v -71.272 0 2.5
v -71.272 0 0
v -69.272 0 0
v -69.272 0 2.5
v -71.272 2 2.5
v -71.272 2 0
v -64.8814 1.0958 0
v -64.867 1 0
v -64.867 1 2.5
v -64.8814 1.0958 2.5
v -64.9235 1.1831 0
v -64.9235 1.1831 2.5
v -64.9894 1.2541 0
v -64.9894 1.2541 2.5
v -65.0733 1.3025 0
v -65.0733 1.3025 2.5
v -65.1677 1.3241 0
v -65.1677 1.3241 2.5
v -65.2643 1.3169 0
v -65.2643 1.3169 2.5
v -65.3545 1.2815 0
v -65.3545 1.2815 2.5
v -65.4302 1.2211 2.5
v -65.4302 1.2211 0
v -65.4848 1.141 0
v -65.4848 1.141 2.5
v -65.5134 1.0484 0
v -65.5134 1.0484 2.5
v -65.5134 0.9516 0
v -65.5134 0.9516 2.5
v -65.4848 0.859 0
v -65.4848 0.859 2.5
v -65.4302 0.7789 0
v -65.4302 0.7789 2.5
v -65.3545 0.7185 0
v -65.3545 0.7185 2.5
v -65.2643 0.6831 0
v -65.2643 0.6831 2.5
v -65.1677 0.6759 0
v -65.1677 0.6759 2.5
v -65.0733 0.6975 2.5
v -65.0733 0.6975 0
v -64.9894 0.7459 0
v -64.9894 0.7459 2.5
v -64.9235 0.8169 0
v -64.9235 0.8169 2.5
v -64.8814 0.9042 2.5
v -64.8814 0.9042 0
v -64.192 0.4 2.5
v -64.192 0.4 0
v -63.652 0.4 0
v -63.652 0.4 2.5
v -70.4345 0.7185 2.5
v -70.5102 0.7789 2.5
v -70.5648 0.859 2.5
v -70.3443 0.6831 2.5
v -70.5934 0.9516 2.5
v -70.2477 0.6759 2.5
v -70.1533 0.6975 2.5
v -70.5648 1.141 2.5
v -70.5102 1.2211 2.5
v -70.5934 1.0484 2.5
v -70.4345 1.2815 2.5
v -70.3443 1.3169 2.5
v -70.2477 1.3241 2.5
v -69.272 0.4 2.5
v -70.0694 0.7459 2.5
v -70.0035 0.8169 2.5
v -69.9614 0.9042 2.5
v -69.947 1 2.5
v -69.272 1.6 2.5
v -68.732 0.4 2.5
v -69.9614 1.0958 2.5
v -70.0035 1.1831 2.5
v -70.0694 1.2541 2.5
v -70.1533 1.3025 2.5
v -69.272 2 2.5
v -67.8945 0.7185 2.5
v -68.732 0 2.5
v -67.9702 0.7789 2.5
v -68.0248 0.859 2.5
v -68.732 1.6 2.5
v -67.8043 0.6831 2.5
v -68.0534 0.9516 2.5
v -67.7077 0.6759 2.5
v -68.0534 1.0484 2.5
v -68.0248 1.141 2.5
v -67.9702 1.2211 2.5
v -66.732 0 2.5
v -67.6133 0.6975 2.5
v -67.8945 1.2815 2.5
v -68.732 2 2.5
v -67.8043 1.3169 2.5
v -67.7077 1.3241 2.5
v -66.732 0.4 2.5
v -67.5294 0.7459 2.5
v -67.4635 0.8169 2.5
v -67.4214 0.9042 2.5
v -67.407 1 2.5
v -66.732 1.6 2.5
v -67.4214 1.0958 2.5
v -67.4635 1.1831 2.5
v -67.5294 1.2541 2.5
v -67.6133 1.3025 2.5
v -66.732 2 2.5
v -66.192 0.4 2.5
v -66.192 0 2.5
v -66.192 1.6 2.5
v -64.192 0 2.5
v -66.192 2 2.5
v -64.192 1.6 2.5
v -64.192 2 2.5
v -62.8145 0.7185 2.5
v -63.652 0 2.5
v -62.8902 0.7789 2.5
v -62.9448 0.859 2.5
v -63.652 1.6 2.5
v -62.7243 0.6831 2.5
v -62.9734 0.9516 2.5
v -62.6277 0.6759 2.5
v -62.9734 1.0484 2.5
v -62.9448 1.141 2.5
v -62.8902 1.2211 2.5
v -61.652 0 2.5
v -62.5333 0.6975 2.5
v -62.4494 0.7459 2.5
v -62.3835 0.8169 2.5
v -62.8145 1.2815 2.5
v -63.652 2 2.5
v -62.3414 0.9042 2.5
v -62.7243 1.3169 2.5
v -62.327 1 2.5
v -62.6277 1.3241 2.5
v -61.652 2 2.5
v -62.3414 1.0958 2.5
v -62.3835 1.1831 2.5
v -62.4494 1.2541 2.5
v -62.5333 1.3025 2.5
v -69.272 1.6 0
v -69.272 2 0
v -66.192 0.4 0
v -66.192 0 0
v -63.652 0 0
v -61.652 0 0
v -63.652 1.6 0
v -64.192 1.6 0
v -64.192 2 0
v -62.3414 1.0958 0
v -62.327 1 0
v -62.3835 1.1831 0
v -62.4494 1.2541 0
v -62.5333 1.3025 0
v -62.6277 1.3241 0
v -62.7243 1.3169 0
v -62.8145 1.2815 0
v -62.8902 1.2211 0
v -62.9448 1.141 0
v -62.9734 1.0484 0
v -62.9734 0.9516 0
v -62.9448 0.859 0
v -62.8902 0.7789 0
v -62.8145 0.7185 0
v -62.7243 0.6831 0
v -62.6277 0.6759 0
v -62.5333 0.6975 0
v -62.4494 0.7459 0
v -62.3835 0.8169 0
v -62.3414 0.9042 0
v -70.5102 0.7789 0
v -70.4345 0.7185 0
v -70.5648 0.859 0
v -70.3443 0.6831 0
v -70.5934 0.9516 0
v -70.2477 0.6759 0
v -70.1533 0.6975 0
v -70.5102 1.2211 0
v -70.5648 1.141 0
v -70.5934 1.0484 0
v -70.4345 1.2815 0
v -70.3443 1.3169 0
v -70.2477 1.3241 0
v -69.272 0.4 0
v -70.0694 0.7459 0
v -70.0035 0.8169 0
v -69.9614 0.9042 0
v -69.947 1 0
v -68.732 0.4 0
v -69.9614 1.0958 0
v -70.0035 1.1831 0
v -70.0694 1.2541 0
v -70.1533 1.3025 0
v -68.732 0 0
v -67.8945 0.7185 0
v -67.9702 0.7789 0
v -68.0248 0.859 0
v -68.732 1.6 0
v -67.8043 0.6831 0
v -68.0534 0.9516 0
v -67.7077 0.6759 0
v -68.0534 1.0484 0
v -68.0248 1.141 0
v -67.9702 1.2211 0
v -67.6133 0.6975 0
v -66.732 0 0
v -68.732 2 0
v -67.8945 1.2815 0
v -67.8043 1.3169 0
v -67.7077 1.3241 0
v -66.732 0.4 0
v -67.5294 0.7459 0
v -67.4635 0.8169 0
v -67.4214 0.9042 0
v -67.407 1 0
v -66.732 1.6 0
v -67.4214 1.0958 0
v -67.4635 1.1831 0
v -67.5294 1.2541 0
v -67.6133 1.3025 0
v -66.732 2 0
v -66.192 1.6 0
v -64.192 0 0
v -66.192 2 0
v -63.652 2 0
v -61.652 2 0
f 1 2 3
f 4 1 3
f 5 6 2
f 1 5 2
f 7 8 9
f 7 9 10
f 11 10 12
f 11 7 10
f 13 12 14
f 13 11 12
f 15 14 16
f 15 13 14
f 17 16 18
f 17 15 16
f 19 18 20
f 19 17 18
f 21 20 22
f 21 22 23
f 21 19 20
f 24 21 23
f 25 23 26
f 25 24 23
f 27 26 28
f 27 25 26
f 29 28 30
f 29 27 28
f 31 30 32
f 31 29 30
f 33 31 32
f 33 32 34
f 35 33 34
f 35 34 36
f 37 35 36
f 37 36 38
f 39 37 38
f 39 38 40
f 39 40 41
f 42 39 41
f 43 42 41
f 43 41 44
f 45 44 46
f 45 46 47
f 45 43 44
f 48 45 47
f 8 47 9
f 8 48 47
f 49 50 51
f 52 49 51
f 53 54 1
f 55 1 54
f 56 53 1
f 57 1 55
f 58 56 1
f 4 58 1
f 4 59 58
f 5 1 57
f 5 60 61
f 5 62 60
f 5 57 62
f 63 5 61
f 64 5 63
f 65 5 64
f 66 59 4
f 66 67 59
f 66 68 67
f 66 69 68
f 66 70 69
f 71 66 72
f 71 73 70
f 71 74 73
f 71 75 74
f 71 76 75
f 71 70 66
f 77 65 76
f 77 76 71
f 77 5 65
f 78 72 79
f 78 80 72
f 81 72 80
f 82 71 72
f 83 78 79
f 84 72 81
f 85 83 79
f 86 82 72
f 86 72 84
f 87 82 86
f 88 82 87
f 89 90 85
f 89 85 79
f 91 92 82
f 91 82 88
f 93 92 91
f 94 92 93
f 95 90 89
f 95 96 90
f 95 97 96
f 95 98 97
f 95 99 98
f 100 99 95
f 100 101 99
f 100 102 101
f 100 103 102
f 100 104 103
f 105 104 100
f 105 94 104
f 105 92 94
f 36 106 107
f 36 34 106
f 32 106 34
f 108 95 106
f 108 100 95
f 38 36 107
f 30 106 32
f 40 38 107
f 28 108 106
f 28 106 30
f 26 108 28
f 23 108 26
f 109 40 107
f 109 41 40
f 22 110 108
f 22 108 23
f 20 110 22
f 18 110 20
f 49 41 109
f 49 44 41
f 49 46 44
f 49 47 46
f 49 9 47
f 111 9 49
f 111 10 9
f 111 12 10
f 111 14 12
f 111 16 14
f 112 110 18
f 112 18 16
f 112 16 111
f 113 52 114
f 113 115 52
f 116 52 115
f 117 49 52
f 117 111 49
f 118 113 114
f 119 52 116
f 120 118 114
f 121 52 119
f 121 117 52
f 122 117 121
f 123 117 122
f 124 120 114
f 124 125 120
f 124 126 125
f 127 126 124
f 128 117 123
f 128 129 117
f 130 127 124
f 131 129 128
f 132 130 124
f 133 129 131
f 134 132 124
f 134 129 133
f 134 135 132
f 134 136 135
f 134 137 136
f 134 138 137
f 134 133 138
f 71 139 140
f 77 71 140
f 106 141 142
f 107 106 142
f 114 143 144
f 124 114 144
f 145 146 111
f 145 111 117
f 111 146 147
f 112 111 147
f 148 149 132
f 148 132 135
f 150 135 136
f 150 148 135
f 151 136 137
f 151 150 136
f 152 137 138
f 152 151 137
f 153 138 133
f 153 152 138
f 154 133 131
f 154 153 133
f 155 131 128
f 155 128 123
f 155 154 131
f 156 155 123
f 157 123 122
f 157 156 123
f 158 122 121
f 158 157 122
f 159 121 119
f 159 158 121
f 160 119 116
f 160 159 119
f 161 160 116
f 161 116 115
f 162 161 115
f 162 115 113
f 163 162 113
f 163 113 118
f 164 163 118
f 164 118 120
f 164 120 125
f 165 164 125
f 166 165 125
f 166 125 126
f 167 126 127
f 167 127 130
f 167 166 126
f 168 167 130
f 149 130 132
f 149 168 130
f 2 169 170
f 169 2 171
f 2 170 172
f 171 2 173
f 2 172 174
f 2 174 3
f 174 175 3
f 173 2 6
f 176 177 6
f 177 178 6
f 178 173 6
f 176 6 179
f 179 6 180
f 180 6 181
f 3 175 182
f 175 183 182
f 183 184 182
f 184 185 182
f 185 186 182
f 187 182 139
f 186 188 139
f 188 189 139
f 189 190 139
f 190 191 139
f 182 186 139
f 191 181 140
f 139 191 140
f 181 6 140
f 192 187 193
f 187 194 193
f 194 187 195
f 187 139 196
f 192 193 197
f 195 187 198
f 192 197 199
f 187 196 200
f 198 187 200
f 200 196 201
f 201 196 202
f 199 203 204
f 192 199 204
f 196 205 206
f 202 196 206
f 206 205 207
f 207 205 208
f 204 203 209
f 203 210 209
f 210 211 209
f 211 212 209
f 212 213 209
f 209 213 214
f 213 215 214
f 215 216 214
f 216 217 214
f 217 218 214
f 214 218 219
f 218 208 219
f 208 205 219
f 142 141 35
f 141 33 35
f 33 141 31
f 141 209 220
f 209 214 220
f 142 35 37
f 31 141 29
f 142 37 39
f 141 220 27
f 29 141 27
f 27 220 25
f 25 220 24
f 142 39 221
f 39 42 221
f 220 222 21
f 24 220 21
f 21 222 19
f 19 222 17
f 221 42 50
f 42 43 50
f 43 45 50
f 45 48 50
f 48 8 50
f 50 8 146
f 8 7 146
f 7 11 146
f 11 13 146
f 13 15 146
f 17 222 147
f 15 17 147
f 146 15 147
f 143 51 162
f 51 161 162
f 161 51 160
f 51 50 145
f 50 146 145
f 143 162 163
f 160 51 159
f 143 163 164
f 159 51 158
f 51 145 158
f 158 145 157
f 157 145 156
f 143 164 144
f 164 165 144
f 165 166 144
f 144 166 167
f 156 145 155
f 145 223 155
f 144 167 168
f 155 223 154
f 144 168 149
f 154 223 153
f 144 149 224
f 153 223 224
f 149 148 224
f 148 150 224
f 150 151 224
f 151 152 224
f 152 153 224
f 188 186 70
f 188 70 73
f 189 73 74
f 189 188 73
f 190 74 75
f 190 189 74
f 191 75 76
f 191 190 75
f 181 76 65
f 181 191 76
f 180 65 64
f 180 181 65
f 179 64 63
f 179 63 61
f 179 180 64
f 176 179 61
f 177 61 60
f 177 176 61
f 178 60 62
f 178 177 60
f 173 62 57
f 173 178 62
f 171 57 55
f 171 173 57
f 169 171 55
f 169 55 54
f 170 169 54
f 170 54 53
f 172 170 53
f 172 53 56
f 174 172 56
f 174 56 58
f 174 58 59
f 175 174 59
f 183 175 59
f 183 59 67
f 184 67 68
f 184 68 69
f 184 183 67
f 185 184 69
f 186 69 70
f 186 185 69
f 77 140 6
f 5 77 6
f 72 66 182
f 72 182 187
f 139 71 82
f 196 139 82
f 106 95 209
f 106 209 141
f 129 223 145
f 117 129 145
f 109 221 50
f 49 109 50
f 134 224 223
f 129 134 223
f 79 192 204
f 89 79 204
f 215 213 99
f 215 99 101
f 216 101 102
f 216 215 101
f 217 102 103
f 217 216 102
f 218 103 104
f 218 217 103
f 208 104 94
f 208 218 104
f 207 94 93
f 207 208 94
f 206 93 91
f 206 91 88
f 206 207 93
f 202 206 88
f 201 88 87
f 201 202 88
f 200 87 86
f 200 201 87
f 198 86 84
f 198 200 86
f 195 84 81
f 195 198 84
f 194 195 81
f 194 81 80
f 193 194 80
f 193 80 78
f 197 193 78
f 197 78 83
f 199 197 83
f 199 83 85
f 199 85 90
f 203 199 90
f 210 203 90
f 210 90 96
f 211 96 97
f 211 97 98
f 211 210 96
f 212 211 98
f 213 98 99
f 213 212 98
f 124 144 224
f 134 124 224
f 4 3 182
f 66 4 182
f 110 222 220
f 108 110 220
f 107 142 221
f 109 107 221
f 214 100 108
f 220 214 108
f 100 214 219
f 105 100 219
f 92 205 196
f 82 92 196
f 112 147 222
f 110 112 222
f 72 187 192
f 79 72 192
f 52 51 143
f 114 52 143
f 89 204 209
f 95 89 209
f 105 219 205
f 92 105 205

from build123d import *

# Parameters (mm, degrees)
F0_R     = 0.325
F0_W     = 0.54
F0_H     = 1.2
F1_DEPTH = 2.5


with BuildPart() as f1:
    # F0 (on Top) → F1 (new body)
    with BuildSketch(Plane.XY):
        Polygon((-71.271986, 0), (-69.271986, 0), (-69.271986, 0.4), (-69.271986, 1.6), (-69.271986, 2), (-71.271986, 2), align=None)
        with Locations((-70.271986, 1)):
            Circle(F0_R, mode=Mode.SUBTRACT)
        with Locations((-69.001986, 1)):
            Rectangle(F0_W, F0_H)
        Polygon((-68.731986, 1.6), (-68.731986, 0.4), (-68.731986, 0), (-66.731986, 0), (-66.731986, 0.4), (-66.731986, 1.6), (-66.731986, 2), (-68.731986, 2), align=None)
        with Locations((-67.731986, 1)):
            Circle(F0_R, mode=Mode.SUBTRACT)
        with Locations((-66.461986, 1)):
            Rectangle(F0_W, F0_H)
        Polygon((-66.191986, 1.6), (-66.191986, 0.4), (-66.191986, 0), (-64.191986, 0), (-64.191986, 0.4), (-64.191986, 1.6), (-64.191986, 2), (-66.191986, 2), align=None)
        with Locations((-65.191986, 1)):
            Circle(F0_R, mode=Mode.SUBTRACT)
        with Locations((-63.921986, 1)):
            Rectangle(F0_W, F0_H)
        Polygon((-63.651986, 1.6), (-63.651986, 0.4), (-63.651986, 0), (-61.651986, 0), (-61.651986, 0.4), (-61.651986, 1.6), (-61.651986, 2), (-63.651986, 2), align=None)
        with Locations((-62.651986, 1)):
            Circle(F0_R, mode=Mode.SUBTRACT)
    extrude(amount=F1_DEPTH)


solid = f1.part
